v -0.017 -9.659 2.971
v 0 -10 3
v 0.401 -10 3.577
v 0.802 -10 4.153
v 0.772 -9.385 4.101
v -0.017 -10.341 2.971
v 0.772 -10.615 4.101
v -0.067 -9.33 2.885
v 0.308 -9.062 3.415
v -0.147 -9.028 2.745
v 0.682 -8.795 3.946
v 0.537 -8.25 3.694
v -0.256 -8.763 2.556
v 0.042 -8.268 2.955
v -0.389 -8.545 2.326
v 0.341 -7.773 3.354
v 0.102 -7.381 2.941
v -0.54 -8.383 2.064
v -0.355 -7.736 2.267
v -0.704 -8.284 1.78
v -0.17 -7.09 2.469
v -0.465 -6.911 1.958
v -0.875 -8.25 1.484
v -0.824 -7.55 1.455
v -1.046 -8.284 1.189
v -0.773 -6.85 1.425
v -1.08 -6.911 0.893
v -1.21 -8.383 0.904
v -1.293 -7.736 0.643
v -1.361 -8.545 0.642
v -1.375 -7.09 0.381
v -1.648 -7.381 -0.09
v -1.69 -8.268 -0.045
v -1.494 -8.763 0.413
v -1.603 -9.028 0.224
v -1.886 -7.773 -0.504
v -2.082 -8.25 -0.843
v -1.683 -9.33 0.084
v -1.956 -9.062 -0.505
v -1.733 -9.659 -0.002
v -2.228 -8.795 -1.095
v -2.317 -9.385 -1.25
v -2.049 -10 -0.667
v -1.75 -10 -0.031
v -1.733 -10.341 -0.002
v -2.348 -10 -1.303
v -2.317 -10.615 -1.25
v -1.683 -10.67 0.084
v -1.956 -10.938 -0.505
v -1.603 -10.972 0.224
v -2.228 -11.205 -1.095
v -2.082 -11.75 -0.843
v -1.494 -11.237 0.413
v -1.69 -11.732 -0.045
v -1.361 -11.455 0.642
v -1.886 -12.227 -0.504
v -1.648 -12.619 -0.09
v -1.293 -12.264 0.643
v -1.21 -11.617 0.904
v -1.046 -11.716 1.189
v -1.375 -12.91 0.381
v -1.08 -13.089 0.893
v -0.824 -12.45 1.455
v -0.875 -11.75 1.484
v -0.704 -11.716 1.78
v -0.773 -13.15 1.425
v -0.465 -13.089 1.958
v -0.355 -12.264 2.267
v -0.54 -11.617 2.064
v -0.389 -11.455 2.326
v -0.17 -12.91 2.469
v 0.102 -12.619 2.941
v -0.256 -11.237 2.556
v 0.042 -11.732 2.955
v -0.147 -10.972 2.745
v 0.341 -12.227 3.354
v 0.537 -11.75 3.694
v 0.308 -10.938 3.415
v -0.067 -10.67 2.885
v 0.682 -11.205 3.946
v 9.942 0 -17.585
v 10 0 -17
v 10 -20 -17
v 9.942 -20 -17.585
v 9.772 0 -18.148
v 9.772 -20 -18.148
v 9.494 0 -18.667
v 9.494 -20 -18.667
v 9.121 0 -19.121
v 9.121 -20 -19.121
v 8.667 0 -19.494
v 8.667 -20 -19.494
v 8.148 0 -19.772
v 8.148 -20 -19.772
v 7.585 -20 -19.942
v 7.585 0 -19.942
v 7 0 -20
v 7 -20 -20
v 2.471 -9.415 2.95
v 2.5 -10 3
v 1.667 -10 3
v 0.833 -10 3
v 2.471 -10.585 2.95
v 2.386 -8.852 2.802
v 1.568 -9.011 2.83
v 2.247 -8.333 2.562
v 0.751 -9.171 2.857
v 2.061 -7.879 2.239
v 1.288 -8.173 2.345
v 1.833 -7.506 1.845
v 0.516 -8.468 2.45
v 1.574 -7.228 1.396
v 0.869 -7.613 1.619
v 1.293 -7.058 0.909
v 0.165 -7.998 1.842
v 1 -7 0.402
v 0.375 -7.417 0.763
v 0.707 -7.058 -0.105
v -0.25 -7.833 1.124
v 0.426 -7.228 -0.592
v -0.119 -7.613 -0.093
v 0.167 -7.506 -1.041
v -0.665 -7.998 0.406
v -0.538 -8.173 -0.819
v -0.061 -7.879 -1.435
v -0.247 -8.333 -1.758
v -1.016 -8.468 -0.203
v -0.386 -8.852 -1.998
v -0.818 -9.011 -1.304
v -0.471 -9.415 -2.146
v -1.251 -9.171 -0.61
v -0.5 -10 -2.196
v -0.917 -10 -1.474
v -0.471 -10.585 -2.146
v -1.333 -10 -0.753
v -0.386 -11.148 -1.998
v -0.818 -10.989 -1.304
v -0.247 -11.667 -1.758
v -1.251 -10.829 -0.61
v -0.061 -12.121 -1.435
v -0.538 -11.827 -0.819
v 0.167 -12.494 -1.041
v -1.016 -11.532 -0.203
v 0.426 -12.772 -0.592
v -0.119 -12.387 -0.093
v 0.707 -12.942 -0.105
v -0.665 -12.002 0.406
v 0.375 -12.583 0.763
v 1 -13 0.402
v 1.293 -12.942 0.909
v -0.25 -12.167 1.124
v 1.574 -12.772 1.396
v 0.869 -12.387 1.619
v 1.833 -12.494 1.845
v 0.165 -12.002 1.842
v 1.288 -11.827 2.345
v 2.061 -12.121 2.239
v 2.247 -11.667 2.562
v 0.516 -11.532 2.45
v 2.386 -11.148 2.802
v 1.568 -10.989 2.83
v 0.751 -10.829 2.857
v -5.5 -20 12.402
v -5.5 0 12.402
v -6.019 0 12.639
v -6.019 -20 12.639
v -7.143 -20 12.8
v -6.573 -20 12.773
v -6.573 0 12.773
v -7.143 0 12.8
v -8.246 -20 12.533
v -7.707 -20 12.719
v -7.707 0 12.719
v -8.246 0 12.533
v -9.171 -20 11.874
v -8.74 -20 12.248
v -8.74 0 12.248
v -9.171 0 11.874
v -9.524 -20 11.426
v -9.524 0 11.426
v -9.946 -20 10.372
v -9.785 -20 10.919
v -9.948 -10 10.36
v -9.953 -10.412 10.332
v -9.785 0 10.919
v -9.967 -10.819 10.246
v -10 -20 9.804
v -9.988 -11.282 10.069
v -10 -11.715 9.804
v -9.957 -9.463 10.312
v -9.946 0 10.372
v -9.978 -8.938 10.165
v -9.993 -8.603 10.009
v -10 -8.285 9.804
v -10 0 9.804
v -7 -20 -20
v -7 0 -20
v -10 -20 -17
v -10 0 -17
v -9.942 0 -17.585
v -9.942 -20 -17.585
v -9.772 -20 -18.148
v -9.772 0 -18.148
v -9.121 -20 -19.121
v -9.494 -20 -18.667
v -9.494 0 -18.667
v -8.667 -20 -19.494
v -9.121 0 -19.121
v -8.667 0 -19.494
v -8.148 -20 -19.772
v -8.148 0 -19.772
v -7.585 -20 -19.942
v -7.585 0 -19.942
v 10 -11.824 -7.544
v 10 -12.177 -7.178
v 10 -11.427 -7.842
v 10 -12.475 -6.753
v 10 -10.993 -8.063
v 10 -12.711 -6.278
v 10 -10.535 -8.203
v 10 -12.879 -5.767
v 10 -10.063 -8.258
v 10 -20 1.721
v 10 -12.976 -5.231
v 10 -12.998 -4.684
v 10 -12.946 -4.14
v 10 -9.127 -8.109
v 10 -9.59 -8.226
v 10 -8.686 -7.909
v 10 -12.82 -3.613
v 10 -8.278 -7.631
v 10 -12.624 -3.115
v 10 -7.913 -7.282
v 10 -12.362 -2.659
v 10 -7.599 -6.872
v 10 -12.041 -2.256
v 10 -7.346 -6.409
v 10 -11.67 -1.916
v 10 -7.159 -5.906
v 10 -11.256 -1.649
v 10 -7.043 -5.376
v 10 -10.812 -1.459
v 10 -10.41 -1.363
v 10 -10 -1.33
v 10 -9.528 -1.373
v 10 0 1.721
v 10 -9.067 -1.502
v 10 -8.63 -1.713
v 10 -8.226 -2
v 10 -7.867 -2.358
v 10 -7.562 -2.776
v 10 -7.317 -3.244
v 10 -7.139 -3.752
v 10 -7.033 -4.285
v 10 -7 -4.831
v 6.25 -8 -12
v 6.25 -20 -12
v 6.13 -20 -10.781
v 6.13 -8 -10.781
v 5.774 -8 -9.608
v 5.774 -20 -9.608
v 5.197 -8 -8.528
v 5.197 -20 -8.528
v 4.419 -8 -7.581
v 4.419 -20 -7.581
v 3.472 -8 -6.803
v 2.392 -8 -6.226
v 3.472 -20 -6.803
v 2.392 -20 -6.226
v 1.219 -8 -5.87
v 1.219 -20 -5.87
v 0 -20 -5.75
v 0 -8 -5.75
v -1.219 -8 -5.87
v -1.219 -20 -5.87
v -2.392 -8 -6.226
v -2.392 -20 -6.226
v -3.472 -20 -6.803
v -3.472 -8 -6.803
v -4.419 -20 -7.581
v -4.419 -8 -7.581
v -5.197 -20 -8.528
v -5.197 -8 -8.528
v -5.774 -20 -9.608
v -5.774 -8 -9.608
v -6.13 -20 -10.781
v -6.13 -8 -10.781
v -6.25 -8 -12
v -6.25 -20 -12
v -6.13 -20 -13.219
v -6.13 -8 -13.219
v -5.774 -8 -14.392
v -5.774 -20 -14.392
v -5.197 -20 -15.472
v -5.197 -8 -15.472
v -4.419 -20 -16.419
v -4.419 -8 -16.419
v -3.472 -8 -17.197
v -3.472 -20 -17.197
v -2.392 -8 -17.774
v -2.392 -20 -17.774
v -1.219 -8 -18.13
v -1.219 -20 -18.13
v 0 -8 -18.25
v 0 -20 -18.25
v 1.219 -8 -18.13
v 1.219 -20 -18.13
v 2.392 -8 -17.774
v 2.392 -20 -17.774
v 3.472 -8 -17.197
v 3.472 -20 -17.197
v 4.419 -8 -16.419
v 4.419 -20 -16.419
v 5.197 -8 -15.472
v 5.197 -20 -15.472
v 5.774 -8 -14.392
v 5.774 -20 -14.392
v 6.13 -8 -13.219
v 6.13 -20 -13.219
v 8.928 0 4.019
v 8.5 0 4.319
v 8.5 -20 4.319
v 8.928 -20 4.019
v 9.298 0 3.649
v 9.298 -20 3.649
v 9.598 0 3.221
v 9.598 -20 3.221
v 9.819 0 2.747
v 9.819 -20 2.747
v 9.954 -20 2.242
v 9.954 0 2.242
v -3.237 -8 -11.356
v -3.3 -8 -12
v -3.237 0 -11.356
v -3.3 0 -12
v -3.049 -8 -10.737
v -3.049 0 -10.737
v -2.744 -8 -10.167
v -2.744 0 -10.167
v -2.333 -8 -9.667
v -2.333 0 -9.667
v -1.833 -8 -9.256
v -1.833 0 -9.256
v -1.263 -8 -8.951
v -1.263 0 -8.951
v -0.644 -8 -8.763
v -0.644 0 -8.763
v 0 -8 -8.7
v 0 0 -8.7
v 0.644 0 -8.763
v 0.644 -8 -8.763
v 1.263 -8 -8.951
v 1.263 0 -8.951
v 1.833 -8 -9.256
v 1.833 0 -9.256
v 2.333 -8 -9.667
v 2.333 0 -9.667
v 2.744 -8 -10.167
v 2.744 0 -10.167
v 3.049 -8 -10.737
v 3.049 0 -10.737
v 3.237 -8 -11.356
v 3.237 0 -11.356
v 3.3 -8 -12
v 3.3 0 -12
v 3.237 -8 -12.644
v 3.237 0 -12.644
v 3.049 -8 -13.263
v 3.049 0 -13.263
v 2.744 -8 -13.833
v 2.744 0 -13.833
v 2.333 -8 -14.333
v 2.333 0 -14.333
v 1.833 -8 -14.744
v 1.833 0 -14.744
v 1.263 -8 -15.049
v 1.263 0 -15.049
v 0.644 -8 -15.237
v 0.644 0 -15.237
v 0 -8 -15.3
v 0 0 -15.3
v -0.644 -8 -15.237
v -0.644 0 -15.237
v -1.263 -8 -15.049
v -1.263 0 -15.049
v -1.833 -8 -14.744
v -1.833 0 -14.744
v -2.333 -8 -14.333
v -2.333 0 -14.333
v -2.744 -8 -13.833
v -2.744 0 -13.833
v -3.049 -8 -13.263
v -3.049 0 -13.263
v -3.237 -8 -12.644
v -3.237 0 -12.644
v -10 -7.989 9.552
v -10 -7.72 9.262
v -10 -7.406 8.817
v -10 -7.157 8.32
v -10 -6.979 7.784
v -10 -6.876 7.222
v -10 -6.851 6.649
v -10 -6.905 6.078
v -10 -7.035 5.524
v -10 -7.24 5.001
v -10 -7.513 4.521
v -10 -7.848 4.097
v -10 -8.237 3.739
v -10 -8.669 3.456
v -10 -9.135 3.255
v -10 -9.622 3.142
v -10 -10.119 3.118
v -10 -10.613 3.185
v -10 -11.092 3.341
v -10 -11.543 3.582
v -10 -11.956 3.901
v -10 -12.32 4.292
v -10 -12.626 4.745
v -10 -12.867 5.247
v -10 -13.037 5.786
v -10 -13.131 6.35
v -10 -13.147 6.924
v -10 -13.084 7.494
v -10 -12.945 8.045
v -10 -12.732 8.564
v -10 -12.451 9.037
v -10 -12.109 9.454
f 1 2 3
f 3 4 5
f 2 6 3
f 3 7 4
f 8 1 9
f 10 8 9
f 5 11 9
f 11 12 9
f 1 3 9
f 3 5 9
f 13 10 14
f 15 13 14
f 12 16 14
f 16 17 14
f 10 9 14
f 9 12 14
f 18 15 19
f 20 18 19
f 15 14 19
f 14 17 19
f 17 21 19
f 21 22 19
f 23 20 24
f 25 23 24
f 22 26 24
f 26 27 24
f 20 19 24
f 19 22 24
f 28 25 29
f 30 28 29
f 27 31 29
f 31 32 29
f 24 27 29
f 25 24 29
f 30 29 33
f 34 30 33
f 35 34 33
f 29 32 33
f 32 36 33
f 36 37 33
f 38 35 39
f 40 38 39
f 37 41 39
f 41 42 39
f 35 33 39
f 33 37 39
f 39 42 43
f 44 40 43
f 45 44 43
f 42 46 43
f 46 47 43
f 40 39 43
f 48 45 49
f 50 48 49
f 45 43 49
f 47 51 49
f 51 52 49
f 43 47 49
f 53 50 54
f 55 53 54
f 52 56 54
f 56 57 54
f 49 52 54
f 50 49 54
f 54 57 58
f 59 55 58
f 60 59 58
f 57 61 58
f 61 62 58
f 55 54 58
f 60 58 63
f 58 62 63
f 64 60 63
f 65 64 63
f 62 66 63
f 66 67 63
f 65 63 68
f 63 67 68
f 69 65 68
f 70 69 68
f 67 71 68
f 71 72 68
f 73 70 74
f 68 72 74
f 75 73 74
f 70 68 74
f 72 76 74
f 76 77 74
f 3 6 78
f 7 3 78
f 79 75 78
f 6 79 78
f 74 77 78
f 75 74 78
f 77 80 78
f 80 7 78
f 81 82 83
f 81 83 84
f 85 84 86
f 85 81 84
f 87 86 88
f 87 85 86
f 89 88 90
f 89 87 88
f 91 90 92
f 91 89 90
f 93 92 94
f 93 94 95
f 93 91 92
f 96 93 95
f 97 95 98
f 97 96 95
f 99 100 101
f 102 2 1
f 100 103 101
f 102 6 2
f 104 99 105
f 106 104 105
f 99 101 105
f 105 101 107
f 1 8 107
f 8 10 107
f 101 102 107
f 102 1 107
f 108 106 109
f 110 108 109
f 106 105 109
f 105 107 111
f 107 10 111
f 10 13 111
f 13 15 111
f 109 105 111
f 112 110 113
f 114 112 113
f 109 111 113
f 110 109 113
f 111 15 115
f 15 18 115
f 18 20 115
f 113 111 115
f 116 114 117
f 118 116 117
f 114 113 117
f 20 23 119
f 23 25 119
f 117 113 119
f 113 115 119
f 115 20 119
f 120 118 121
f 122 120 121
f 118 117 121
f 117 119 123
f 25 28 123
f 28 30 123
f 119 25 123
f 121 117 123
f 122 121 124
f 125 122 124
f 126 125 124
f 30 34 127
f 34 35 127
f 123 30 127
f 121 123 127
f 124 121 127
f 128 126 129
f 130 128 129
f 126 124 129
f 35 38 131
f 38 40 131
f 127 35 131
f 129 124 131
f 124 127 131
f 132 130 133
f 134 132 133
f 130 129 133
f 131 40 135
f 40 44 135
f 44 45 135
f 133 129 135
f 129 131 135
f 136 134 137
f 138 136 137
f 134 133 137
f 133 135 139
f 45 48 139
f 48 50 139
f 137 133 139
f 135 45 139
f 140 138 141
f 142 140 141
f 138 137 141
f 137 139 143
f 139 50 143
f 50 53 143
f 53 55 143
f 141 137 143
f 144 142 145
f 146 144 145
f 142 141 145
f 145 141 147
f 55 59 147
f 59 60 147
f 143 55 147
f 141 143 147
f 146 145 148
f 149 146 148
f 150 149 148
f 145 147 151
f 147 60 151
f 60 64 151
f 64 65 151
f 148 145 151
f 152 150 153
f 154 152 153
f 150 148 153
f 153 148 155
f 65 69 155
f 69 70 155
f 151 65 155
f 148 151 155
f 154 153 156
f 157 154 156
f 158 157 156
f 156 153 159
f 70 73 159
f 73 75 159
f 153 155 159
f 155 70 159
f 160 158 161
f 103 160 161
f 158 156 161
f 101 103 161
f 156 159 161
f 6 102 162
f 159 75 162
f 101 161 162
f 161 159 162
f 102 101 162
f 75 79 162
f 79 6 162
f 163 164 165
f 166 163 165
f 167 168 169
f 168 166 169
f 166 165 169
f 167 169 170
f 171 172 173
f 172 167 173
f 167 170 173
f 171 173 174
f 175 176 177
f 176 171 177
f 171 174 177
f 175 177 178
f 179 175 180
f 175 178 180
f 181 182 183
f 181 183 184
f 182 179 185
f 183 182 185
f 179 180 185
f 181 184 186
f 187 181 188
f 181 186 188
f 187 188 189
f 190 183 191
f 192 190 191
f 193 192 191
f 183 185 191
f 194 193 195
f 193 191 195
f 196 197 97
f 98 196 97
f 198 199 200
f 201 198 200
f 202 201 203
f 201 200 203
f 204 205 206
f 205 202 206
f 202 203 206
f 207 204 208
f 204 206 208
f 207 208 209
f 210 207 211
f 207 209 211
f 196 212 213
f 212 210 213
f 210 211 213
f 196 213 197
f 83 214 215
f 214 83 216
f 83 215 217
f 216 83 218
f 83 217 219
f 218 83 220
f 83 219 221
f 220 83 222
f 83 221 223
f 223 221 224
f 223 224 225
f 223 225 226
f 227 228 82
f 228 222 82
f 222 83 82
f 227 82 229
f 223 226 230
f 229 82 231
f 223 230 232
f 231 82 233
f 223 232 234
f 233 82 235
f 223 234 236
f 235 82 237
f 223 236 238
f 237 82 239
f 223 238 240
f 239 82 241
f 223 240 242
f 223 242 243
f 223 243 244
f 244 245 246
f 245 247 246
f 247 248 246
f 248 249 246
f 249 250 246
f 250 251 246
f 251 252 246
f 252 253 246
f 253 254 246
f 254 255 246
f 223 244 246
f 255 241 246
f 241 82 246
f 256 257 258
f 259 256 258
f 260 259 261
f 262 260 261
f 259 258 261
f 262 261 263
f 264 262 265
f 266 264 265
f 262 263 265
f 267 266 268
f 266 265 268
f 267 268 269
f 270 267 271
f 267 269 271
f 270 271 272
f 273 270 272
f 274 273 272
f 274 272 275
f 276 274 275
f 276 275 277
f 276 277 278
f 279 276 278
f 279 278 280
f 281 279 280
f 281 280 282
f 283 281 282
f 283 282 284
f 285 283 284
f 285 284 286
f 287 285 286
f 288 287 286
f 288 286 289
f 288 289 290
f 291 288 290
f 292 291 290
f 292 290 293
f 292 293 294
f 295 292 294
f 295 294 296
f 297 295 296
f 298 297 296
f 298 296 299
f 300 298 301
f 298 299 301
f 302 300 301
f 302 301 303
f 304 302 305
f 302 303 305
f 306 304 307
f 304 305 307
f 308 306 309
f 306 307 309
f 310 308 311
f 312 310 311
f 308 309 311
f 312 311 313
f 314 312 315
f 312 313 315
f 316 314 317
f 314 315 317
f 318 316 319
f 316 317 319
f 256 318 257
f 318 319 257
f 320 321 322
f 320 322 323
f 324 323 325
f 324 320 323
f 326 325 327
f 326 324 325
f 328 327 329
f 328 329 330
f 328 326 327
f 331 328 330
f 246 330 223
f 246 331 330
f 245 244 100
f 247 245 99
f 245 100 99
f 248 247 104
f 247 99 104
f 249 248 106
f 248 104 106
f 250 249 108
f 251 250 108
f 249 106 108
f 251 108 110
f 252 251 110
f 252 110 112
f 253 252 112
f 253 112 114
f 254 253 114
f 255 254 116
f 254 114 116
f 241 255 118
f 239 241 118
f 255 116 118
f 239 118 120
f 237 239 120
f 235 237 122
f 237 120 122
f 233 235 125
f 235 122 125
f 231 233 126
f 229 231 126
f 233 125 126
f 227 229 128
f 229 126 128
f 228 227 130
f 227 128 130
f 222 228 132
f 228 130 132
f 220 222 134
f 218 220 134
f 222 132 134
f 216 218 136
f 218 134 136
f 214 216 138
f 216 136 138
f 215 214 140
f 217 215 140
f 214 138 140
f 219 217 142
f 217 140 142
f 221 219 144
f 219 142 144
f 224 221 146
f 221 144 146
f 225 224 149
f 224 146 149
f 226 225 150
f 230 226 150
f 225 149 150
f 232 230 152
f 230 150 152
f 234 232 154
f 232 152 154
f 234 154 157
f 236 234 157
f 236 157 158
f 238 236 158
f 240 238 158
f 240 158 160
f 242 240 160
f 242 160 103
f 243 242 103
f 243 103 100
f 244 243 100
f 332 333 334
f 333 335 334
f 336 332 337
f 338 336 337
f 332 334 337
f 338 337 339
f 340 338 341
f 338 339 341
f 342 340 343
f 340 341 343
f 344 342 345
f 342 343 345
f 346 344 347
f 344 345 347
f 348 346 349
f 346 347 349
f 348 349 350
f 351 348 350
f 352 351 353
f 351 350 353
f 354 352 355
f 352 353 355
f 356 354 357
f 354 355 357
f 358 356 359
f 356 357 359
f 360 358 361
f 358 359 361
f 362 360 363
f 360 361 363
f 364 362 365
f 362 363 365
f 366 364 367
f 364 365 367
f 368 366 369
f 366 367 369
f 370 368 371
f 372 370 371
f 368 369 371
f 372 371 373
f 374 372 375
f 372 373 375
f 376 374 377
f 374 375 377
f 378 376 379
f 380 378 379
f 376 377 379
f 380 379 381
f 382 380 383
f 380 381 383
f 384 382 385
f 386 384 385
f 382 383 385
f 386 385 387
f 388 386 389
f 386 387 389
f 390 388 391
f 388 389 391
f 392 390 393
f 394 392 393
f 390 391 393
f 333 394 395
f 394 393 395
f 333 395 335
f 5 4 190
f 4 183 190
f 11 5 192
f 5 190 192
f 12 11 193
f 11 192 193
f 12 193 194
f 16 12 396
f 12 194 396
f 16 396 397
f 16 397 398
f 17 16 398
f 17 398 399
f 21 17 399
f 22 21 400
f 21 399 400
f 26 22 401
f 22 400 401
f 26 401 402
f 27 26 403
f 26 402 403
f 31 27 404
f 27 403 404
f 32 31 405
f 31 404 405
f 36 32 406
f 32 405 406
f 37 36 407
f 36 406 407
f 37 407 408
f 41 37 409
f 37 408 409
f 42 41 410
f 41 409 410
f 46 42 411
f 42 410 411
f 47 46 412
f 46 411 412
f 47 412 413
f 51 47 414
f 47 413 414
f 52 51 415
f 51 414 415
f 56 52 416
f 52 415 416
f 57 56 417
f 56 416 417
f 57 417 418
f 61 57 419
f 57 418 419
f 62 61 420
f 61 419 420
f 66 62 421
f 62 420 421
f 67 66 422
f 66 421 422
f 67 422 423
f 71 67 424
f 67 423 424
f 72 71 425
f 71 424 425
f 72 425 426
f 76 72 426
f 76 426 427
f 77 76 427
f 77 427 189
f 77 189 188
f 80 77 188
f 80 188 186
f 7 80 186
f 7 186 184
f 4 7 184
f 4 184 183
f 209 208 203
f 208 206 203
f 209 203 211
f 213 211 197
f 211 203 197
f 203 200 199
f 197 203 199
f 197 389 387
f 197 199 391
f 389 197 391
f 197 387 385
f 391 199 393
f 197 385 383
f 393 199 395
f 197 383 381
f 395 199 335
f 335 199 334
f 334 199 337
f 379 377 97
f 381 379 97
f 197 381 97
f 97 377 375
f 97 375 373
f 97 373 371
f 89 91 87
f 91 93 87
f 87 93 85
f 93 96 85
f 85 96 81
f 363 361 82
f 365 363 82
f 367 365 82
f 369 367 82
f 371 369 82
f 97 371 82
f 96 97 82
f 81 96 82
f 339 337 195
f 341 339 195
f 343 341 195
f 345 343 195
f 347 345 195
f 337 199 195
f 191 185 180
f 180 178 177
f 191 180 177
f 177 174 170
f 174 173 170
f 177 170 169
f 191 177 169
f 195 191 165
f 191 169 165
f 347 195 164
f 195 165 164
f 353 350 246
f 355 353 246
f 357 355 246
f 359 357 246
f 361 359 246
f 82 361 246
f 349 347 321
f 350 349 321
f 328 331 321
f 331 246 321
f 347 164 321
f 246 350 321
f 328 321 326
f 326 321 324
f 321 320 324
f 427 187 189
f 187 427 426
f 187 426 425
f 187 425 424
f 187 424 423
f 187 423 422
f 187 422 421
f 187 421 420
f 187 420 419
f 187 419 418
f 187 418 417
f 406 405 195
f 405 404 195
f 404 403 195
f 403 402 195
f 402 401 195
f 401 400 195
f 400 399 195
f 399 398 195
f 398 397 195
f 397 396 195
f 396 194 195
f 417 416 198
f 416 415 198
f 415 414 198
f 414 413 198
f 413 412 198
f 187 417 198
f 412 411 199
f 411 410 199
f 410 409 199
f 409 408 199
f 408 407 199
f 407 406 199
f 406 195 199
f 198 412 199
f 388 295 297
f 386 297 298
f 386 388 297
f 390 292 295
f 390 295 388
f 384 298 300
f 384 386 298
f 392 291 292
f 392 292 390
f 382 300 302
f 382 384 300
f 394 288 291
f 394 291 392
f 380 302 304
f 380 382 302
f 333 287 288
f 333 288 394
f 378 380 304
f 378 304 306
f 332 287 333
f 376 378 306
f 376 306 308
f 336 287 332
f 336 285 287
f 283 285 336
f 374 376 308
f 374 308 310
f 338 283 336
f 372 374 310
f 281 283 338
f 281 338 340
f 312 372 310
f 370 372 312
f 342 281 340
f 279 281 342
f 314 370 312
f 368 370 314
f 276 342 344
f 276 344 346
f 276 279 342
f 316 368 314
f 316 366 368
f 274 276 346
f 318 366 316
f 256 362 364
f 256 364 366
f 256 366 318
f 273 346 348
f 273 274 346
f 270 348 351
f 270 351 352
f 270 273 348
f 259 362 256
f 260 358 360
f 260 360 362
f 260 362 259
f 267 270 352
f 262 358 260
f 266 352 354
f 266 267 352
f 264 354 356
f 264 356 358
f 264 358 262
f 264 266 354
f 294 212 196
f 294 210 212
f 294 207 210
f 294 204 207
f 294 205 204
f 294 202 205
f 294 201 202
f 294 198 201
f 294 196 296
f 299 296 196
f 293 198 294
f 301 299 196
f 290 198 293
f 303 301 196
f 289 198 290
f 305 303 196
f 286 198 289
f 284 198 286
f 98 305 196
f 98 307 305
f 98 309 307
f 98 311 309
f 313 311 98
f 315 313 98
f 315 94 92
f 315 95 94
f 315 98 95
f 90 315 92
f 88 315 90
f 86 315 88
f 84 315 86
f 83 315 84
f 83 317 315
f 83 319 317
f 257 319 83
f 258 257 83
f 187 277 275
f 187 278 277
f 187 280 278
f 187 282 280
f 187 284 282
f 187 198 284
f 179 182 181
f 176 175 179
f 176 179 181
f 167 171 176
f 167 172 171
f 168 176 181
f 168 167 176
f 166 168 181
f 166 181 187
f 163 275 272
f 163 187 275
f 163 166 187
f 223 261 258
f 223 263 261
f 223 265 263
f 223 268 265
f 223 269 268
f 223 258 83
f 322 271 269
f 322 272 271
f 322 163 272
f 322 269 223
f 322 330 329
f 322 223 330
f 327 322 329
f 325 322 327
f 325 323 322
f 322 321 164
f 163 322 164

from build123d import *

# Parameters (mm, degrees)
F1_DEPTH       = 20
F5_D           = 6.6
F5_CBORE_D     = 12.5
F5_CBORE_DEPTH = 12
F7_T1_DEPTH    = 45.9807621135
F7_T3_DEPTH    = 28.6602540378
F7_T5_DEPTH    = 35


# Not quite as in the source:
# - a fillet or chamfer that OpenCascade refuses, or shapes differently, is made with other operations: its cross-section is extruded or revolved along the edge and cut away or added


with BuildPart() as f1:
    # F0 (on Front) → F1 (new body)
    with BuildSketch(Plane.XZ):
        Polygon((-10, -20), (10, -20), (10, 3.4529946162), (-10, 15), align=None)
    extrude(amount=F1_DEPTH)

    # F5 (through all)
    with Locations(Plane.XZ.offset(20)):
        with Locations((0, -12)):
            CounterBoreHole(F5_D / 2, F5_CBORE_D / 2, F5_CBORE_DEPTH)

    # F3 (on offset) → F6 (revolve, cut)
    with BuildSketch(Plane.XZ.offset(10)):
        Polygon((-10.3968404344, 10.6191993773), (-10.3968404344, 6.9818926814), (13.3675798804, -6.7385017846), (13.3675798804, -3.2744001694), (2.5, 3), (0, 3), (0.8023552889, 4.1533407117), align=None)
    revolve(axis=Axis((1.485369723, -10, 0.1216954484), (-0.8660254038, 0, 0.5)), mode=Mode.SUBTRACT)

    # F7: fillet of radius 3 on 4 edges, made by hand

    # F7_s2 → F7_t1 (cut)
    with BuildSketch(Plane.XZ.offset(-12.9903810568)):
        with BuildLine():
            ThreePointArc((-5.5, 12.4019237886), (-8.5, 12.4019237886), (-10, 9.8038475773))
            Line((-10, 9.8038475773), (-10, 15))
            Line((-10, 15), (-5.5, 12.4019237886))
        make_face()
    extrude(amount=F7_T1_DEPTH, mode=Mode.SUBTRACT)

    # F7_s4 → F7_t3 (cut)
    with BuildSketch(Plane.XZ.offset(-4.3301270189)):
        with BuildLine():
            ThreePointArc((8.5, 4.31902002), (9.5980762114, 3.2209438086), (10, 1.7209438086))
            Line((10, 1.7209438086), (10, 3.4529946162))
            Line((10, 3.4529946162), (8.5, 4.31902002))
        make_face()
    extrude(amount=F7_T3_DEPTH, mode=Mode.SUBTRACT)

    # F7_s6 → F7_t5 (cut)
    with BuildSketch(Plane.XZ.offset(-7.5)):
        with BuildLine():
            ThreePointArc((10, -17), (9.1213203436, -19.1213203436), (7, -20))
            Line((7, -20), (10, -20))
            Line((10, -20), (10, -17))
        make_face()
        with BuildLine():
            ThreePointArc((-10, -17), (-9.1213203436, -19.1213203436), (-7, -20))
            Line((-7, -20), (-10, -20))
            Line((-10, -20), (-10, -17))
        make_face()
    extrude(amount=F7_T5_DEPTH, mode=Mode.SUBTRACT)


solid = f1.part
